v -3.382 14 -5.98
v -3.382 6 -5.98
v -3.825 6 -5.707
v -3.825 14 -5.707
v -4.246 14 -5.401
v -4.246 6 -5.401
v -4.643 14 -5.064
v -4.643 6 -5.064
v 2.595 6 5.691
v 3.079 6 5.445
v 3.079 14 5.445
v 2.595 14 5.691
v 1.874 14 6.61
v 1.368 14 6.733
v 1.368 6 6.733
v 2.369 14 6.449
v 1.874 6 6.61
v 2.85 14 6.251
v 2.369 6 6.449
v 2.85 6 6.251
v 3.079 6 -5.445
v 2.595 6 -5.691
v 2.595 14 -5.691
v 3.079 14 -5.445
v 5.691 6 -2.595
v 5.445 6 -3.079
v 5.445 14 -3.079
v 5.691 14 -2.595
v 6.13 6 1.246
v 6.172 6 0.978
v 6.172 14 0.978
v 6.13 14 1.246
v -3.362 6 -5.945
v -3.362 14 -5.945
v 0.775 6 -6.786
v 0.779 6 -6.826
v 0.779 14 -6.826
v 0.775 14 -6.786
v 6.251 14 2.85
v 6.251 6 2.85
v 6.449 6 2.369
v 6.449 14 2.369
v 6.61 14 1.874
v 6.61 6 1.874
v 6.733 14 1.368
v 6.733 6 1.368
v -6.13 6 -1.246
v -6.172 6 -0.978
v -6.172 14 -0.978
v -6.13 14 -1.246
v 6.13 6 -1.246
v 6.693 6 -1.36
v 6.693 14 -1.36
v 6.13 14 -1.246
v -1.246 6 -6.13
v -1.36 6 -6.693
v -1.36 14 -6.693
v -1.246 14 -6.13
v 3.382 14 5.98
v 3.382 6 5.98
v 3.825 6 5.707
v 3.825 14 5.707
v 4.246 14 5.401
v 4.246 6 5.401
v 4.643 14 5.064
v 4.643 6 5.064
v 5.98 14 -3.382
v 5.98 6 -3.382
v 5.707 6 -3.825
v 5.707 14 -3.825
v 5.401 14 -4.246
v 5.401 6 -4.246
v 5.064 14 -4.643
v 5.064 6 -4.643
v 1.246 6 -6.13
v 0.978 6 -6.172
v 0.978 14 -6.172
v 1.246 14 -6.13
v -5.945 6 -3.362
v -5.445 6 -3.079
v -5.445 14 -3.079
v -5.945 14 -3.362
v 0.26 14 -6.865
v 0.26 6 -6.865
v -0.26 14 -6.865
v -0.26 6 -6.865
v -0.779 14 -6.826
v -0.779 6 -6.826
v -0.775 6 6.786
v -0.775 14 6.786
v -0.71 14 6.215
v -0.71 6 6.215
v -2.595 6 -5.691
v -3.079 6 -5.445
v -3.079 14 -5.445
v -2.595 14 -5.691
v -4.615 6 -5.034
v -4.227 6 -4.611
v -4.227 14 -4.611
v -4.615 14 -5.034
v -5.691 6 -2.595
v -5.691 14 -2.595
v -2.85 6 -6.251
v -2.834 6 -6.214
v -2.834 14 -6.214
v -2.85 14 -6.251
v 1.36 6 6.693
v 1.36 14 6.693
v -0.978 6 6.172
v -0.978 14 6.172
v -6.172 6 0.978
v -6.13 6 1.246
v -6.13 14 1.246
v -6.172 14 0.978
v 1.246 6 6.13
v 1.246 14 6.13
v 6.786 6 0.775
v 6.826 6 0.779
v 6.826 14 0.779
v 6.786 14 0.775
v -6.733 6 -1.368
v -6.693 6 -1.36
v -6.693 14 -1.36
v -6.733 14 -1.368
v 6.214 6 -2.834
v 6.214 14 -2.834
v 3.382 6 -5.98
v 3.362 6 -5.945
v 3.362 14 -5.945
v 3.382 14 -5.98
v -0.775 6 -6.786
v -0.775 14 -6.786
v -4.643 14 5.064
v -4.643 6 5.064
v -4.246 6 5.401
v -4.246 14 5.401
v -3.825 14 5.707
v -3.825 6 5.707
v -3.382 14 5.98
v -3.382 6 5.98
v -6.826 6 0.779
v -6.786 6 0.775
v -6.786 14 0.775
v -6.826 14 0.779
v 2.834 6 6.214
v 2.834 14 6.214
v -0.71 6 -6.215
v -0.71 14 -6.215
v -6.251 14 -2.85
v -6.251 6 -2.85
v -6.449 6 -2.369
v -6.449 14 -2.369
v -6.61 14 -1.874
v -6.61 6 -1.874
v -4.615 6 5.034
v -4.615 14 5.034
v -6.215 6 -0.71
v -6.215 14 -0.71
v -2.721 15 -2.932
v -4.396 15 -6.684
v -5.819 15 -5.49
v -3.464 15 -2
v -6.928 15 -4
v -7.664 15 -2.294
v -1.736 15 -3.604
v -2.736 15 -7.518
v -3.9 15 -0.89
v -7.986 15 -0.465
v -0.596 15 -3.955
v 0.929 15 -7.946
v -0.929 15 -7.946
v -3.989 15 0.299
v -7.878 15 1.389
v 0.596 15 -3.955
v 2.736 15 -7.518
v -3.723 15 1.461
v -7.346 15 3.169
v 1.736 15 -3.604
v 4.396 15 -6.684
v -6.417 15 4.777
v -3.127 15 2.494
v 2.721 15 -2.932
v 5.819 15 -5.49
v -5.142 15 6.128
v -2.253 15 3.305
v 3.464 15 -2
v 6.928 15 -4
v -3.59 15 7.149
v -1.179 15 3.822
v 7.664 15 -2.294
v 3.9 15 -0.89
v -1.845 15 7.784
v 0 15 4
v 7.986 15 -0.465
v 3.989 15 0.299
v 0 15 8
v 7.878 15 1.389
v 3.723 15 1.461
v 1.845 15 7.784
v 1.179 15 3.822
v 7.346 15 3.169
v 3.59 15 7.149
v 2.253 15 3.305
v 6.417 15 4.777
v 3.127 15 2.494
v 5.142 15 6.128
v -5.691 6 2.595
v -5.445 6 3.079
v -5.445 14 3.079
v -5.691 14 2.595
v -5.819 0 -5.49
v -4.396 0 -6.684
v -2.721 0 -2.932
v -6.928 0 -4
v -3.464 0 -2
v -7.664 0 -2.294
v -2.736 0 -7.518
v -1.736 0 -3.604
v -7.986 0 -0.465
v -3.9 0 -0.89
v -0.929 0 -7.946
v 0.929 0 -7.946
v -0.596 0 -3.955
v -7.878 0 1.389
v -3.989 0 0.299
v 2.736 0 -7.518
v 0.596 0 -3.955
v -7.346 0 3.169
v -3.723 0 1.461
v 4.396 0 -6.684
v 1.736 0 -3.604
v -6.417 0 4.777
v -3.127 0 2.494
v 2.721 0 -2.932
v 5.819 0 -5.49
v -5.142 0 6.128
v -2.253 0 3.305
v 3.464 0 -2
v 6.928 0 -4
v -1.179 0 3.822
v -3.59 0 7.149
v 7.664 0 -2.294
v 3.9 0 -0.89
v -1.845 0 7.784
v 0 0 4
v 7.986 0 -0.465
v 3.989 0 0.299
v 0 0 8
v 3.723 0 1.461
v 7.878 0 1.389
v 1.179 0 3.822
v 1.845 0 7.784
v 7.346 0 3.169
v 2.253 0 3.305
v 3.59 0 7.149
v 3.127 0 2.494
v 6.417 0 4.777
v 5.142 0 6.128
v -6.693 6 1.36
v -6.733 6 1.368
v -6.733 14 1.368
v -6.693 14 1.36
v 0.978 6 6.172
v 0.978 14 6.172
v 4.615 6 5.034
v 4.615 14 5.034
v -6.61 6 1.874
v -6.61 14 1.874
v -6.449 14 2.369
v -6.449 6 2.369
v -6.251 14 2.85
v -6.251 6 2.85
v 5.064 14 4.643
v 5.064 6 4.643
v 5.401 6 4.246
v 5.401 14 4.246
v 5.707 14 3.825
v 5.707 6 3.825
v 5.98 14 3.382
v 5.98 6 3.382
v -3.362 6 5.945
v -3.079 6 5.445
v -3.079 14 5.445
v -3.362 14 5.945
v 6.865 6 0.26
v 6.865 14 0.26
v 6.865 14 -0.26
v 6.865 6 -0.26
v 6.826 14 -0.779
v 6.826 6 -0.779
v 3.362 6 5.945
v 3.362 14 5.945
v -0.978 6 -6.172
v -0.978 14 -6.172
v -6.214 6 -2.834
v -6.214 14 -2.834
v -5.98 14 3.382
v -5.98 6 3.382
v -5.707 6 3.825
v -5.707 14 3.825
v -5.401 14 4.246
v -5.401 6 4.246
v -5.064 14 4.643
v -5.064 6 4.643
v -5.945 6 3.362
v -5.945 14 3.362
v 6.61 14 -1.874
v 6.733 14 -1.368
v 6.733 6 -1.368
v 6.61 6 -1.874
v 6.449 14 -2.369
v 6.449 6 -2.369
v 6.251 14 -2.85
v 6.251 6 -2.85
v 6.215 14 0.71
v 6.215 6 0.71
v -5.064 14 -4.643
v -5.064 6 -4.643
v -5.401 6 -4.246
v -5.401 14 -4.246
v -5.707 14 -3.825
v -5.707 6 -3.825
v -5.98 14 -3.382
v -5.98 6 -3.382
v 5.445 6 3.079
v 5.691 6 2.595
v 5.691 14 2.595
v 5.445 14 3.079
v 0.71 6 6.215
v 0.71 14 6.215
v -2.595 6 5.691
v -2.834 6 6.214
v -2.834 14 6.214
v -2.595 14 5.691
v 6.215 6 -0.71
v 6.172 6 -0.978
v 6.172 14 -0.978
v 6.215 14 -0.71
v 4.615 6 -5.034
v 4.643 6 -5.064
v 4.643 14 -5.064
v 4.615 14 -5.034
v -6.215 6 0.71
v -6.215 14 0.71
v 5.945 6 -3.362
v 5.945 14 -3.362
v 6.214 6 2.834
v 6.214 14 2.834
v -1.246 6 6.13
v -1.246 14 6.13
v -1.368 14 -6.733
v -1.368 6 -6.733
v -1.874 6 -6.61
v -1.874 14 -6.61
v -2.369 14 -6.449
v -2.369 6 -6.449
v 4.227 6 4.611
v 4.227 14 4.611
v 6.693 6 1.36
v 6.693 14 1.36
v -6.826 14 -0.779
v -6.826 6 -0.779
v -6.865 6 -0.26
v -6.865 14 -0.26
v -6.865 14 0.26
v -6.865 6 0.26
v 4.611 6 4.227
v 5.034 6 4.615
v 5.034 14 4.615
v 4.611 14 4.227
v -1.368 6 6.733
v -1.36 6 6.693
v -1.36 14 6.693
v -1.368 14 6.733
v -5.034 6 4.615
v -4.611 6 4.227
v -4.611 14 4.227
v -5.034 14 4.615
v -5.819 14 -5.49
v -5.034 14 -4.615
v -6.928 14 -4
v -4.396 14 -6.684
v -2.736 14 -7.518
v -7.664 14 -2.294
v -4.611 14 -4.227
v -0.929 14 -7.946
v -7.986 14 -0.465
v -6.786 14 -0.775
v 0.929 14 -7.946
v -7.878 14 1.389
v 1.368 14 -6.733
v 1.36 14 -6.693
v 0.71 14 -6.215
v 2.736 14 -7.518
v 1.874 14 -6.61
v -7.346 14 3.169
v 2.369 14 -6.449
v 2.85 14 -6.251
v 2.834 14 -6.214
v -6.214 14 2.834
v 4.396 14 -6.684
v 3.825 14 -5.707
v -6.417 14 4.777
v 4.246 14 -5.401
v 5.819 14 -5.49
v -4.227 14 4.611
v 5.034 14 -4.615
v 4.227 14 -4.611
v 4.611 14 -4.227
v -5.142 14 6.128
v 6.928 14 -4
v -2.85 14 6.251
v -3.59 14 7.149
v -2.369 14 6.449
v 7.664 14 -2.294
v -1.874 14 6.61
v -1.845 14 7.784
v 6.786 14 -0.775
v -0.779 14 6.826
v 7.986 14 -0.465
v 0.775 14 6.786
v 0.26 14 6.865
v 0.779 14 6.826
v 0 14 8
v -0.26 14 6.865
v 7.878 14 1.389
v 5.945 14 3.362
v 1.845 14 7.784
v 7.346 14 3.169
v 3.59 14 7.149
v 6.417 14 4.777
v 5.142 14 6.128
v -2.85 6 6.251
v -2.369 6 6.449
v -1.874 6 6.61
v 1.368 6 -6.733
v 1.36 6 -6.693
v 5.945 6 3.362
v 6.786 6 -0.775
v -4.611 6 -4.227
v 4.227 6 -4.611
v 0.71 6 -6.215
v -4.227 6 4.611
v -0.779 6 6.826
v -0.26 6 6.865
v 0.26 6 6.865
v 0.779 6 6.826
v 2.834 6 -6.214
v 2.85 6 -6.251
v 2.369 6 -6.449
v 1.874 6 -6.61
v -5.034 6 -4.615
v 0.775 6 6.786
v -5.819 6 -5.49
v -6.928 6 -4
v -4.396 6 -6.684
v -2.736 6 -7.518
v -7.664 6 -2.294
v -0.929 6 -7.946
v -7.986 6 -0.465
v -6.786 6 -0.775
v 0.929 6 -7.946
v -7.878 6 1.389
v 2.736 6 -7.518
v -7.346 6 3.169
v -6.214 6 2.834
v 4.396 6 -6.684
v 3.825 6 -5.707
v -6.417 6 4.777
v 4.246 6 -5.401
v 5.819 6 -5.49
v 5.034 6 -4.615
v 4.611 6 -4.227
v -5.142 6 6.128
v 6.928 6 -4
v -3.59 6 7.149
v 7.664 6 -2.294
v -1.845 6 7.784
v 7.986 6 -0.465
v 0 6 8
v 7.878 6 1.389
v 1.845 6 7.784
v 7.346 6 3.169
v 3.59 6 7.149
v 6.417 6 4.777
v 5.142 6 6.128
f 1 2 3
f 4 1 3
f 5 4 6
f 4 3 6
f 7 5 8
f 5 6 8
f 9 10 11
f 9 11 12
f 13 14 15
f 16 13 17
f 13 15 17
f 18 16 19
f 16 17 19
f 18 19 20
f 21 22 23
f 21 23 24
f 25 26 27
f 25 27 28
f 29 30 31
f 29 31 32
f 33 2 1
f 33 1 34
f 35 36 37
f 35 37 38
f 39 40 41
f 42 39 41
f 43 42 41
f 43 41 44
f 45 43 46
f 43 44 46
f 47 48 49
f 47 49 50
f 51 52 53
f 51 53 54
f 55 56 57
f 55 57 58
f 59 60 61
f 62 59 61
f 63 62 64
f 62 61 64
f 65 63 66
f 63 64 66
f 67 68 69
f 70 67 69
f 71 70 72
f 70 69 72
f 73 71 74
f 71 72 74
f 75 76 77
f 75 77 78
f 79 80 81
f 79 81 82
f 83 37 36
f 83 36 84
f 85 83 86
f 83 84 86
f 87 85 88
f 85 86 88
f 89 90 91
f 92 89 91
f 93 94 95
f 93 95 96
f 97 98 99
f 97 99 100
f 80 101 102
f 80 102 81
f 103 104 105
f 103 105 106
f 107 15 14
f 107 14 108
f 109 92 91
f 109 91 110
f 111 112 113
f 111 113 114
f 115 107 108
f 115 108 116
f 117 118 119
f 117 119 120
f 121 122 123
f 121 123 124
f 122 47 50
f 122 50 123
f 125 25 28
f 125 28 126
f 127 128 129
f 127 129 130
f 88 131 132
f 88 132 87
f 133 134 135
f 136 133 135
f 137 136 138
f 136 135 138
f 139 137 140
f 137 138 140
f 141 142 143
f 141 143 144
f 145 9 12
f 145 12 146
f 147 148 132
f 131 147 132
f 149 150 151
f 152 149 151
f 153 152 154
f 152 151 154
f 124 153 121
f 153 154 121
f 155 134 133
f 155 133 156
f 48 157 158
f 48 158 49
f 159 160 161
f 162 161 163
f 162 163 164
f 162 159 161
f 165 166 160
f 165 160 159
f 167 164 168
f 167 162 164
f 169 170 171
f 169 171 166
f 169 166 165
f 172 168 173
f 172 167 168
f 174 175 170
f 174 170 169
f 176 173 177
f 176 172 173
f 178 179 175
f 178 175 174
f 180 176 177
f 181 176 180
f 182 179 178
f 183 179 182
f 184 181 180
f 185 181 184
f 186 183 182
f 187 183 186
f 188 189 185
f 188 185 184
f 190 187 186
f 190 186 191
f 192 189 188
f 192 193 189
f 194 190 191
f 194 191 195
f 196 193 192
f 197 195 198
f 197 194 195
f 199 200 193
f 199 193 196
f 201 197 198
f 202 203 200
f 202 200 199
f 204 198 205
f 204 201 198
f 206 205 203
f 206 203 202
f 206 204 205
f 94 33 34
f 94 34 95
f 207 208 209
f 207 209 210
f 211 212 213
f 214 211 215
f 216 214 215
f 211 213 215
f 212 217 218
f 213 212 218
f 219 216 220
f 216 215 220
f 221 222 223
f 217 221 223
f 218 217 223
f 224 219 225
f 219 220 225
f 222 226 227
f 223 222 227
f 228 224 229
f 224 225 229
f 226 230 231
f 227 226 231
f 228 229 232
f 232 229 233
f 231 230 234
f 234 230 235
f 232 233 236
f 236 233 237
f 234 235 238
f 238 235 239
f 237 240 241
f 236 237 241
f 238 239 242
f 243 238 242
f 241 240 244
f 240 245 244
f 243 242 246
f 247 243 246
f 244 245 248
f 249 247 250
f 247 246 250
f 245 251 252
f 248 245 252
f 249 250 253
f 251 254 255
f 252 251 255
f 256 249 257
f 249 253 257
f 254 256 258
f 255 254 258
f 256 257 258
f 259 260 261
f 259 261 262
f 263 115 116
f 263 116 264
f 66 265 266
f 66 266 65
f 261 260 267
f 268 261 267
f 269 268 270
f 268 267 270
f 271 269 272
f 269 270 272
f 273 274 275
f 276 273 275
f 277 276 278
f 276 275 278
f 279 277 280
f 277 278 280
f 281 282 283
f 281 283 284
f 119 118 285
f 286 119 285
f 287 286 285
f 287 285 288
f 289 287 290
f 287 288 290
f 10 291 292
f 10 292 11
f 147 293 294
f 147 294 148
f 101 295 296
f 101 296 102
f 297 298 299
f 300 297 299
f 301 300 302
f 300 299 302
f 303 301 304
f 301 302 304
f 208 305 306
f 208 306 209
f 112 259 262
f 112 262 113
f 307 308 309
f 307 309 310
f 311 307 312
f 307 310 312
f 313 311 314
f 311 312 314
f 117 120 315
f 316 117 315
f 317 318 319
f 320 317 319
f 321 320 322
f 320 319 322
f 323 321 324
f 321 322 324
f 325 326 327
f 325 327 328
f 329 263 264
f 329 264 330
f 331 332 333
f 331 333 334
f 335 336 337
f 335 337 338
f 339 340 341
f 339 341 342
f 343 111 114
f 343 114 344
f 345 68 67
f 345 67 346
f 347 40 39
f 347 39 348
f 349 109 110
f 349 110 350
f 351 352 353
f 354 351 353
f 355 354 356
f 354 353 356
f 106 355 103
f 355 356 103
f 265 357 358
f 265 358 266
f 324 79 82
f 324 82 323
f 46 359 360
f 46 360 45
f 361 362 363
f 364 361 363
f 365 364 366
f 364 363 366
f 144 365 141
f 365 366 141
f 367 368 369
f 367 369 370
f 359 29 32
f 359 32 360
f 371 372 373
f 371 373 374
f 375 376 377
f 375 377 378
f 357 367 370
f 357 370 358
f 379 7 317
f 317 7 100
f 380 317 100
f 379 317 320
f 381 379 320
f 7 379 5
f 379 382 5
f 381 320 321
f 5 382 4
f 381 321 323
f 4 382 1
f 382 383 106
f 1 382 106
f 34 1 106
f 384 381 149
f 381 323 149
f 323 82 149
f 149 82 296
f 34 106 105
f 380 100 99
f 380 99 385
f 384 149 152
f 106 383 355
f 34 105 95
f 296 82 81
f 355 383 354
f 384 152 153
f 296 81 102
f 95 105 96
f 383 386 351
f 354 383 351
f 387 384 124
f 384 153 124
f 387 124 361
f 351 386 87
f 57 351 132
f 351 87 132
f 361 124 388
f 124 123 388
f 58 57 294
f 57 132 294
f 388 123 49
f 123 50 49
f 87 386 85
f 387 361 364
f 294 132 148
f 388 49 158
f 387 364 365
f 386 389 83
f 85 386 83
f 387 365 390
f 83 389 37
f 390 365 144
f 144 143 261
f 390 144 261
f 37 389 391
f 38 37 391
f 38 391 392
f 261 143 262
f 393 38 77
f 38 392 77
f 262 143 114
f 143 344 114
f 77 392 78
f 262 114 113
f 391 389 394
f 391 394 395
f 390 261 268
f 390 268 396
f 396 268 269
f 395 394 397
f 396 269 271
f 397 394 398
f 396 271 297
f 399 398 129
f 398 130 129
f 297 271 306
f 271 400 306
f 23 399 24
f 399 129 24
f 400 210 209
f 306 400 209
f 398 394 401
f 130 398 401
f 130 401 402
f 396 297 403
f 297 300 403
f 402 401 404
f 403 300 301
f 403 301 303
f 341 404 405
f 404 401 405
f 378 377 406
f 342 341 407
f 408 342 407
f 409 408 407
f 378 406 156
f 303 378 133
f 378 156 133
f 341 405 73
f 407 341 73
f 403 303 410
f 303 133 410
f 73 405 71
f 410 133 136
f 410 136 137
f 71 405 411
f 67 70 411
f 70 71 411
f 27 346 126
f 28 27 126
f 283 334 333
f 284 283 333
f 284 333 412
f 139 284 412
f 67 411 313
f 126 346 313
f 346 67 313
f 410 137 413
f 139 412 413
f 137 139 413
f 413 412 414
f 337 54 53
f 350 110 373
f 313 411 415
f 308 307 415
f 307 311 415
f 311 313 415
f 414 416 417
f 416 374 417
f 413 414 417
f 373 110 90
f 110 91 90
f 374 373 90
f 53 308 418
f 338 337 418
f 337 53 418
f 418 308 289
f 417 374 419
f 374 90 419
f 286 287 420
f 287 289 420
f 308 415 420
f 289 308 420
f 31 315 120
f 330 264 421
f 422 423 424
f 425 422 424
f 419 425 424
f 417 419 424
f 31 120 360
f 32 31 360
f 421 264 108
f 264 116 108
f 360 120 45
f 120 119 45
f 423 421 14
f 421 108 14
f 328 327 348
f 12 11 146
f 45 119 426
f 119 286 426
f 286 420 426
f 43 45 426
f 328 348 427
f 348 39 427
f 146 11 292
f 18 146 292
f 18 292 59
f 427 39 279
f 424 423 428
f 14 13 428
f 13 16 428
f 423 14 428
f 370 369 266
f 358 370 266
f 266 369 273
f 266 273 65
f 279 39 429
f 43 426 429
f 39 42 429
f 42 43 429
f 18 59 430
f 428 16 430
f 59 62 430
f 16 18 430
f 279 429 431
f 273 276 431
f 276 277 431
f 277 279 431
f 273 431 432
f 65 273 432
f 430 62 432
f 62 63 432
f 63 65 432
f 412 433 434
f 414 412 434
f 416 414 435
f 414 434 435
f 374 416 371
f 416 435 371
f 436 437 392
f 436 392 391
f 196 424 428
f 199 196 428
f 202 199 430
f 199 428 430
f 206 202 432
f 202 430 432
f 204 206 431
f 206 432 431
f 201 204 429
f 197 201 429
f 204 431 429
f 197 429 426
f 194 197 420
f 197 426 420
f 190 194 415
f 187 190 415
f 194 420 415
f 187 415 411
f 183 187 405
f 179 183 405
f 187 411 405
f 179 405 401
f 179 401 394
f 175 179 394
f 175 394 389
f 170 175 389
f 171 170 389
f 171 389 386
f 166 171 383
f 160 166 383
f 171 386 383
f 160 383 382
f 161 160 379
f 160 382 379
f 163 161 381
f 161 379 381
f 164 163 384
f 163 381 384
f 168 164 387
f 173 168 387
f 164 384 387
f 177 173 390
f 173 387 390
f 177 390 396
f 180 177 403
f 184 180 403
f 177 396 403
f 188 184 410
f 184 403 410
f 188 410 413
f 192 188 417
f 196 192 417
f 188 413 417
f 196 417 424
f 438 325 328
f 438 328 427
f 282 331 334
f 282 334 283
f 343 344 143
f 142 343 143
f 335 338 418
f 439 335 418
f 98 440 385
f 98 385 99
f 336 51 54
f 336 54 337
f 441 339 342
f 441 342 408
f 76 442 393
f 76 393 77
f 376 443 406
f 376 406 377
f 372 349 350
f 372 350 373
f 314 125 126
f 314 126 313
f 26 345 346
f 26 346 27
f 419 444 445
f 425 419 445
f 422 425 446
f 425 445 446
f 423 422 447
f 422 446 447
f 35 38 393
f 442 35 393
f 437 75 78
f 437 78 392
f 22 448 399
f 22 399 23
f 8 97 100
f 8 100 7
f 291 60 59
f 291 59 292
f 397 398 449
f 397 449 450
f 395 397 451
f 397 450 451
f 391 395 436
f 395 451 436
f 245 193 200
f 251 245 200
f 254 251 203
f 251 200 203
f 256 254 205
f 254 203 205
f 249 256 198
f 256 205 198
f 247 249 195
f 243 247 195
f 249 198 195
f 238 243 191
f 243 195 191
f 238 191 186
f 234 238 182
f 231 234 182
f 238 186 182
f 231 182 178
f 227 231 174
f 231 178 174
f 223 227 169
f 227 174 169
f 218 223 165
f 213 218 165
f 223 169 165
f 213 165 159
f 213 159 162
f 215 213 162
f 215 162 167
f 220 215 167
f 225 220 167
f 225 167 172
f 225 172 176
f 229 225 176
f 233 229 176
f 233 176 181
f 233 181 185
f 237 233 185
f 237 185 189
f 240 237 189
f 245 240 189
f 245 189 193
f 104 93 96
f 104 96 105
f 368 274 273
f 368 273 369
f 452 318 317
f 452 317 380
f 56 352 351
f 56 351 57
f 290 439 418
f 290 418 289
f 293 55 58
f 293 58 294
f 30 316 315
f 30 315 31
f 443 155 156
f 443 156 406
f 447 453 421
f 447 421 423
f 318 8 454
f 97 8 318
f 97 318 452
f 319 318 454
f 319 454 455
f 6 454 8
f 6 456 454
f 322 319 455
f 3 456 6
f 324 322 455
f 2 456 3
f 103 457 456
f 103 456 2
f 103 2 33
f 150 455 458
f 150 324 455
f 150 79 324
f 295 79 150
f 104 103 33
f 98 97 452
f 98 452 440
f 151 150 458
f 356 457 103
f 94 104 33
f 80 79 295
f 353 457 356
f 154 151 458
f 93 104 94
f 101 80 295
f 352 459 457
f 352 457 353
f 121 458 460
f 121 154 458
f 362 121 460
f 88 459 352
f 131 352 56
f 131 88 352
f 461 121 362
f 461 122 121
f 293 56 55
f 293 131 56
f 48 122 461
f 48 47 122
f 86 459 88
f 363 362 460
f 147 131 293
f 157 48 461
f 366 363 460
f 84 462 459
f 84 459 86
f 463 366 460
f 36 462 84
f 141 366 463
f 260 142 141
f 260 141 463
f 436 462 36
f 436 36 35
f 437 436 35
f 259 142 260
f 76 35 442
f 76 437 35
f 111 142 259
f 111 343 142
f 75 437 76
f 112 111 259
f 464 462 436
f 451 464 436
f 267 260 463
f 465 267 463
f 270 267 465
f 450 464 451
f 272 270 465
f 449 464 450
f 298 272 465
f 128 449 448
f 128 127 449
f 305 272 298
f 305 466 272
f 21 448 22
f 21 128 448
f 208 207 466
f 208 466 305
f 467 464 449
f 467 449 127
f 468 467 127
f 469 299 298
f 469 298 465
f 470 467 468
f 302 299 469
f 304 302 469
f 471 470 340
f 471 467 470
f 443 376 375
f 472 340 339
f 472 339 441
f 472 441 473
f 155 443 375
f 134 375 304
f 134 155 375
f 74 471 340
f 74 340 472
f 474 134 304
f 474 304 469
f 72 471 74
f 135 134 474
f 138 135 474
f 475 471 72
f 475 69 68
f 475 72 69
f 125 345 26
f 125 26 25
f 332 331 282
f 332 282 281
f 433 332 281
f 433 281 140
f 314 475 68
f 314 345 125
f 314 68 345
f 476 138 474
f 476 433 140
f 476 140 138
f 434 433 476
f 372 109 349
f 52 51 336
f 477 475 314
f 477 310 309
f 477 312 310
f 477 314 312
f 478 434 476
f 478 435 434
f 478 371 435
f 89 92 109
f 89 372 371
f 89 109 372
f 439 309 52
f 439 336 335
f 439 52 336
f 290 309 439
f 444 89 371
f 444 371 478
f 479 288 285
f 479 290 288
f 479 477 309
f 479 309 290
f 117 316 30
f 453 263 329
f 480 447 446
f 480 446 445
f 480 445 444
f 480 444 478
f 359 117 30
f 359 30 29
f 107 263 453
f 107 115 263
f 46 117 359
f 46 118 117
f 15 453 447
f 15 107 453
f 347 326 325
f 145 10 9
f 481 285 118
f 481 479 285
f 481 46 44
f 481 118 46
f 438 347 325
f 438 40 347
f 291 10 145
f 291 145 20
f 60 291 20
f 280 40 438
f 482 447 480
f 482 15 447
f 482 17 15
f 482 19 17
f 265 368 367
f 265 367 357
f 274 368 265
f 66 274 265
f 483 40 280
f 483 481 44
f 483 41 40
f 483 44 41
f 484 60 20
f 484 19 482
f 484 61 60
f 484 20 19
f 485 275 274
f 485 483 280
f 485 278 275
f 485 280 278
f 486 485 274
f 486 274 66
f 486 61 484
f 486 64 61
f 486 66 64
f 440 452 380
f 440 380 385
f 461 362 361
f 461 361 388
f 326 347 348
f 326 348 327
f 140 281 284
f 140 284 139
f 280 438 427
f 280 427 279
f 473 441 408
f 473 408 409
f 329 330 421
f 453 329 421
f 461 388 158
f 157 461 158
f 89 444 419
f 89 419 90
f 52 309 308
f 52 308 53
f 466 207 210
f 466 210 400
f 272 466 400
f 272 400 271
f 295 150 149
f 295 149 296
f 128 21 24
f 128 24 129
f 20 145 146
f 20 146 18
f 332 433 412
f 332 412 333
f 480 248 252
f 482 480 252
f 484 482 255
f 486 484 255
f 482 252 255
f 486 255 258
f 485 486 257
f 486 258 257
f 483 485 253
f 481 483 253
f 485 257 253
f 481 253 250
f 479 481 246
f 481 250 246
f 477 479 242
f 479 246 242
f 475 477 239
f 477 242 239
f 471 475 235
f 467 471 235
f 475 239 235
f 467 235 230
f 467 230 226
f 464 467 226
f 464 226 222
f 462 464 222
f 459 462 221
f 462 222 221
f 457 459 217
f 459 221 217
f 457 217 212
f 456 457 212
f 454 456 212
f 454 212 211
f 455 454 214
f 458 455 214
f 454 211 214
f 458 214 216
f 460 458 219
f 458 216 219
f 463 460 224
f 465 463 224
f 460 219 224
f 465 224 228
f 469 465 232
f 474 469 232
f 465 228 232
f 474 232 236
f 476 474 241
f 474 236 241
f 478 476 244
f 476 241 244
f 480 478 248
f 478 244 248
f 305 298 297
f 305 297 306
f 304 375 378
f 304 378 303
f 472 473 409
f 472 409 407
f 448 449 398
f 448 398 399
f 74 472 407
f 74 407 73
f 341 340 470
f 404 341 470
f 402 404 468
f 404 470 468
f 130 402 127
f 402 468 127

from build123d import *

# Parameters (mm, degrees)
SKETCH_1_R          = 8
EXTRUDE_1_DEPTH     = 6
SKETCH_2_R          = 6.870177757
EXTRUDE_2_DEPTH     = 8
CUT_EXTRUDE_START   = -8
CUT_EXTRUDE_1_DEPTH = 8
SKETCH_4_R          = 8
EXTRUDE_3_DEPTH     = 1
SKETCH_5_R          = 4
CUT_EXTRUDE_2_DEPTH = 19.788294228


with BuildPart() as part:
    # 草图1 → 凸台-拉伸1 (new body)
    with BuildSketch(Plane(origin=(0, 0, 0), x_dir=(1, 0, 0), z_dir=(0, 1, 0))):
        with Locations(Location((0, 0, 0), (0, 0, 270))):
            Circle(SKETCH_1_R)
    extrude(amount=EXTRUDE_1_DEPTH)

    # 草图2 → 凸台-拉伸2 (add)
    with BuildSketch(Plane(origin=(0, 6, 0), x_dir=(1, 0, 0), z_dir=(0, 1, 0))):
        with Locations(Location((0, 0, 0), (0, 0, 270))):
            Circle(SKETCH_2_R)
    extrude(amount=EXTRUDE_2_DEPTH)

    # 草图3 → 切除-拉伸1 (cut)
    with BuildSketch(Plane(origin=(0, 14, 0), x_dir=(1, 0, 0), z_dir=(0, 1, 0)).offset(CUT_EXTRUDE_START)):
        with BuildLine():
            Line((-0.70957594, 6.214911676), (-0.774732582, 6.785594468))
            Line((-0.774732582, 6.785594468), (-0.779326709, 6.825832718))
            ThreePointArc((-0.779326709, 6.825832718), (-1.074732582, 6.785594468), (-1.368114565, 6.732577883))
            Line((-1.368114565, 6.732577883), (-1.360049537, 6.69288937))
            Line((-1.360049537, 6.69288937), (-1.245666505, 6.130003271))
            Line((-1.245666505, 6.130003271), (-0.977621222, 6.172457473))
            Line((-0.977621222, 6.172457473), (-0.70957594, 6.214911676))
        make_face()
        with BuildLine():
            Line((1.245666505, 6.130003271), (1.360049537, 6.69288937))
            Line((1.360049537, 6.69288937), (1.368114565, 6.732577883))
            ThreePointArc((1.368114565, 6.732577883), (1.074732582, 6.785594468), (0.779326709, 6.825832718))
            Line((0.779326709, 6.825832718), (0.774732582, 6.785594468))
            Line((0.774732582, 6.785594468), (0.70957594, 6.214911676))
            Line((0.70957594, 6.214911676), (0.977621222, 6.172457473))
            Line((0.977621222, 6.172457473), (1.245666505, 6.130003271))
        make_face()
        with BuildLine():
            Line((3.078974433, 5.445047437), (3.361700531, 5.945037628))
            Line((3.361700531, 5.945037628), (3.381635254, 5.980291416))
            ThreePointArc((3.381635254, 5.980291416), (3.118995433, 6.121373204), (2.850482056, 6.250927488))
            Line((2.850482056, 6.250927488), (2.833678478, 6.214078302))
            Line((2.833678478, 6.214078302), (2.595360147, 5.691461223))
            Line((2.595360147, 5.691461223), (2.83716729, 5.56825433))
            Line((2.83716729, 5.56825433), (3.078974433, 5.445047437))
        make_face()
        with BuildLine():
            Line((4.610890891, 4.227092421), (5.034284855, 4.615244181))
            Line((5.034284855, 4.615244181), (5.064137923, 4.642612358))
            ThreePointArc((5.064137923, 4.642612358), (4.85794928, 4.85794928), (4.642612358, 5.064137923))
            Line((4.642612358, 5.064137923), (4.615244181, 5.034284855))
            Line((4.615244181, 5.034284855), (4.227092421, 4.610890891))
            Line((4.227092421, 4.610890891), (4.418991656, 4.418991656))
            Line((4.418991656, 4.418991656), (4.610890891, 4.227092421))
        make_face()
        with BuildLine():
            Line((5.691461223, 2.595360147), (6.214078302, 2.833678478))
            Line((6.214078302, 2.833678478), (6.250927488, 2.850482056))
            ThreePointArc((6.250927488, 2.850482056), (6.121373204, 3.118995433), (5.980291416, 3.381635254))
            Line((5.980291416, 3.381635254), (5.945037628, 3.361700531))
            Line((5.945037628, 3.361700531), (5.445047437, 3.078974433))
            Line((5.445047437, 3.078974433), (5.56825433, 2.83716729))
            Line((5.56825433, 2.83716729), (5.691461223, 2.595360147))
        make_face()
        with BuildLine():
            Line((6.214911676, 0.70957594), (6.785594468, 0.774732582))
            Line((6.785594468, 0.774732582), (6.825832718, 0.779326709))
            ThreePointArc((6.825832718, 0.779326709), (6.785594468, 1.074732582), (6.732577883, 1.368114565))
            Line((6.732577883, 1.368114565), (6.69288937, 1.360049537))
            Line((6.69288937, 1.360049537), (6.130003271, 1.245666505))
            Line((6.130003271, 1.245666505), (6.172457473, 0.977621222))
            Line((6.172457473, 0.977621222), (6.214911676, 0.70957594))
        make_face()
        with BuildLine():
            Line((6.130003271, -1.245666505), (6.69288937, -1.360049537))
            Line((6.69288937, -1.360049537), (6.732577883, -1.368114565))
            ThreePointArc((6.732577883, -1.368114565), (6.785594468, -1.074732582), (6.825832718, -0.779326709))
            Line((6.825832718, -0.779326709), (6.785594468, -0.774732582))
            Line((6.785594468, -0.774732582), (6.214911676, -0.70957594))
            Line((6.214911676, -0.70957594), (6.172457473, -0.977621222))
            Line((6.172457473, -0.977621222), (6.130003271, -1.245666505))
        make_face()
        with BuildLine():
            Line((5.445047437, -3.078974433), (5.945037628, -3.361700531))
            Line((5.945037628, -3.361700531), (5.980291416, -3.381635254))
            ThreePointArc((5.980291416, -3.381635254), (6.121373204, -3.118995433), (6.250927488, -2.850482056))
            Line((6.250927488, -2.850482056), (6.214078302, -2.833678478))
            Line((6.214078302, -2.833678478), (5.691461223, -2.595360147))
            Line((5.691461223, -2.595360147), (5.56825433, -2.83716729))
            Line((5.56825433, -2.83716729), (5.445047437, -3.078974433))
        make_face()
        with BuildLine():
            Line((4.227092421, -4.610890891), (4.615244181, -5.034284855))
            Line((4.615244181, -5.034284855), (4.642612358, -5.064137923))
            ThreePointArc((4.642612358, -5.064137923), (4.85794928, -4.85794928), (5.064137923, -4.642612358))
            Line((5.064137923, -4.642612358), (5.034284855, -4.615244181))
            Line((5.034284855, -4.615244181), (4.610890891, -4.227092421))
            Line((4.610890891, -4.227092421), (4.418991656, -4.418991656))
            Line((4.418991656, -4.418991656), (4.227092421, -4.610890891))
        make_face()
        with BuildLine():
            Line((2.595360147, -5.691461223), (2.833678478, -6.214078302))
            Line((2.833678478, -6.214078302), (2.850482056, -6.250927488))
            ThreePointArc((2.850482056, -6.250927488), (3.118995433, -6.121373204), (3.381635254, -5.980291416))
            Line((3.381635254, -5.980291416), (3.361700531, -5.945037628))
            Line((3.361700531, -5.945037628), (3.078974433, -5.445047437))
            Line((3.078974433, -5.445047437), (2.83716729, -5.56825433))
            Line((2.83716729, -5.56825433), (2.595360147, -5.691461223))
        make_face()
        with BuildLine():
            Line((0.70957594, -6.214911676), (0.774732582, -6.785594468))
            Line((0.774732582, -6.785594468), (0.779326709, -6.825832718))
            ThreePointArc((0.779326709, -6.825832718), (1.074732582, -6.785594468), (1.368114565, -6.732577883))
            Line((1.368114565, -6.732577883), (1.360049537, -6.69288937))
            Line((1.360049537, -6.69288937), (1.245666505, -6.130003271))
            Line((1.245666505, -6.130003271), (0.977621222, -6.172457473))
            Line((0.977621222, -6.172457473), (0.70957594, -6.214911676))
        make_face()
        with BuildLine():
            Line((-1.245666505, -6.130003271), (-1.360049537, -6.69288937))
            Line((-1.360049537, -6.69288937), (-1.368114565, -6.732577883))
            ThreePointArc((-1.368114565, -6.732577883), (-1.074732582, -6.785594468), (-0.779326709, -6.825832718))
            Line((-0.779326709, -6.825832718), (-0.774732582, -6.785594468))
            Line((-0.774732582, -6.785594468), (-0.70957594, -6.214911676))
            Line((-0.70957594, -6.214911676), (-0.977621222, -6.172457473))
            Line((-0.977621222, -6.172457473), (-1.245666505, -6.130003271))
        make_face()
        with BuildLine():
            Line((-3.078974433, -5.445047437), (-3.361700531, -5.945037628))
            Line((-3.361700531, -5.945037628), (-3.381635254, -5.980291416))
            ThreePointArc((-3.381635254, -5.980291416), (-3.118995433, -6.121373204), (-2.850482056, -6.250927488))
            Line((-2.850482056, -6.250927488), (-2.833678478, -6.214078302))
            Line((-2.833678478, -6.214078302), (-2.595360147, -5.691461223))
            Line((-2.595360147, -5.691461223), (-2.83716729, -5.56825433))
            Line((-2.83716729, -5.56825433), (-3.078974433, -5.445047437))
        make_face()
        with BuildLine():
            Line((-4.610890891, -4.227092421), (-5.034284855, -4.615244181))
            Line((-5.034284855, -4.615244181), (-5.064137923, -4.642612358))
            ThreePointArc((-5.064137923, -4.642612358), (-4.85794928, -4.85794928), (-4.642612358, -5.064137923))
            Line((-4.642612358, -5.064137923), (-4.615244181, -5.034284855))
            Line((-4.615244181, -5.034284855), (-4.227092421, -4.610890891))
            Line((-4.227092421, -4.610890891), (-4.418991656, -4.418991656))
            Line((-4.418991656, -4.418991656), (-4.610890891, -4.227092421))
        make_face()
        with BuildLine():
            Line((-5.691461223, -2.595360147), (-6.214078302, -2.833678478))
            Line((-6.214078302, -2.833678478), (-6.250927488, -2.850482056))
            ThreePointArc((-6.250927488, -2.850482056), (-6.121373204, -3.118995433), (-5.980291416, -3.381635254))
            Line((-5.980291416, -3.381635254), (-5.945037628, -3.361700531))
            Line((-5.945037628, -3.361700531), (-5.445047437, -3.078974433))
            Line((-5.445047437, -3.078974433), (-5.56825433, -2.83716729))
            Line((-5.56825433, -2.83716729), (-5.691461223, -2.595360147))
        make_face()
        with BuildLine():
            Line((-6.214911676, -0.70957594), (-6.785594468, -0.774732582))
            Line((-6.785594468, -0.774732582), (-6.825832718, -0.779326709))
            ThreePointArc((-6.825832718, -0.779326709), (-6.785594468, -1.074732582), (-6.732577883, -1.368114565))
            Line((-6.732577883, -1.368114565), (-6.69288937, -1.360049537))
            Line((-6.69288937, -1.360049537), (-6.130003271, -1.245666505))
            Line((-6.130003271, -1.245666505), (-6.172457473, -0.977621222))
            Line((-6.172457473, -0.977621222), (-6.214911676, -0.70957594))
        make_face()
        with BuildLine():
            Line((-6.130003271, 1.245666505), (-6.69288937, 1.360049537))
            Line((-6.69288937, 1.360049537), (-6.732577883, 1.368114565))
            ThreePointArc((-6.732577883, 1.368114565), (-6.785594468, 1.074732582), (-6.825832718, 0.779326709))
            Line((-6.825832718, 0.779326709), (-6.785594468, 0.774732582))
            Line((-6.785594468, 0.774732582), (-6.214911676, 0.70957594))
            Line((-6.214911676, 0.70957594), (-6.172457473, 0.977621222))
            Line((-6.172457473, 0.977621222), (-6.130003271, 1.245666505))
        make_face()
        with BuildLine():
            Line((-5.445047437, 3.078974433), (-5.945037628, 3.361700531))
            Line((-5.945037628, 3.361700531), (-5.980291416, 3.381635254))
            ThreePointArc((-5.980291416, 3.381635254), (-6.121373204, 3.118995433), (-6.250927488, 2.850482056))
            Line((-6.250927488, 2.850482056), (-6.214078302, 2.833678478))
            Line((-6.214078302, 2.833678478), (-5.691461223, 2.595360147))
            Line((-5.691461223, 2.595360147), (-5.56825433, 2.83716729))
            Line((-5.56825433, 2.83716729), (-5.445047437, 3.078974433))
        make_face()
        with BuildLine():
            Line((-4.227092421, 4.610890891), (-4.615244181, 5.034284855))
            Line((-4.615244181, 5.034284855), (-4.642612358, 5.064137923))
            ThreePointArc((-4.642612358, 5.064137923), (-4.85794928, 4.85794928), (-5.064137923, 4.642612358))
            Line((-5.064137923, 4.642612358), (-5.034284855, 4.615244181))
            Line((-5.034284855, 4.615244181), (-4.610890891, 4.227092421))
            Line((-4.610890891, 4.227092421), (-4.418991656, 4.418991656))
            Line((-4.418991656, 4.418991656), (-4.227092421, 4.610890891))
        make_face()
        with BuildLine():
            Line((-2.595360147, 5.691461223), (-2.833678478, 6.214078302))
            Line((-2.833678478, 6.214078302), (-2.850482056, 6.250927488))
            ThreePointArc((-2.850482056, 6.250927488), (-3.118995433, 6.121373204), (-3.381635254, 5.980291416))
            Line((-3.381635254, 5.980291416), (-3.361700531, 5.945037628))
            Line((-3.361700531, 5.945037628), (-3.078974433, 5.445047437))
            Line((-3.078974433, 5.445047437), (-2.83716729, 5.56825433))
            Line((-2.83716729, 5.56825433), (-2.595360147, 5.691461223))
        make_face()
    extrude(amount=CUT_EXTRUDE_1_DEPTH, mode=Mode.SUBTRACT)

    # 草图4 → 凸台-拉伸3 (add)
    with BuildSketch(Plane(origin=(0, 14, 0), x_dir=(1, 0, 0), z_dir=(0, 1, 0))):
        with Locations(Location((0, 0, 0), (0, 0, 270))):
            Circle(SKETCH_4_R)
    extrude(amount=EXTRUDE_3_DEPTH)

    # 草图5 → 切除-拉伸2 (cut, through all)
    with BuildSketch(Plane(origin=(0, 15, 0), x_dir=(1, 0, 0), z_dir=(0, 1, 0))):
        with Locations(Location((0, 0, 0), (0, 0, 270))):
            Circle(SKETCH_5_R)
    extrude(amount=-CUT_EXTRUDE_2_DEPTH, mode=Mode.SUBTRACT)


solid = part.part
